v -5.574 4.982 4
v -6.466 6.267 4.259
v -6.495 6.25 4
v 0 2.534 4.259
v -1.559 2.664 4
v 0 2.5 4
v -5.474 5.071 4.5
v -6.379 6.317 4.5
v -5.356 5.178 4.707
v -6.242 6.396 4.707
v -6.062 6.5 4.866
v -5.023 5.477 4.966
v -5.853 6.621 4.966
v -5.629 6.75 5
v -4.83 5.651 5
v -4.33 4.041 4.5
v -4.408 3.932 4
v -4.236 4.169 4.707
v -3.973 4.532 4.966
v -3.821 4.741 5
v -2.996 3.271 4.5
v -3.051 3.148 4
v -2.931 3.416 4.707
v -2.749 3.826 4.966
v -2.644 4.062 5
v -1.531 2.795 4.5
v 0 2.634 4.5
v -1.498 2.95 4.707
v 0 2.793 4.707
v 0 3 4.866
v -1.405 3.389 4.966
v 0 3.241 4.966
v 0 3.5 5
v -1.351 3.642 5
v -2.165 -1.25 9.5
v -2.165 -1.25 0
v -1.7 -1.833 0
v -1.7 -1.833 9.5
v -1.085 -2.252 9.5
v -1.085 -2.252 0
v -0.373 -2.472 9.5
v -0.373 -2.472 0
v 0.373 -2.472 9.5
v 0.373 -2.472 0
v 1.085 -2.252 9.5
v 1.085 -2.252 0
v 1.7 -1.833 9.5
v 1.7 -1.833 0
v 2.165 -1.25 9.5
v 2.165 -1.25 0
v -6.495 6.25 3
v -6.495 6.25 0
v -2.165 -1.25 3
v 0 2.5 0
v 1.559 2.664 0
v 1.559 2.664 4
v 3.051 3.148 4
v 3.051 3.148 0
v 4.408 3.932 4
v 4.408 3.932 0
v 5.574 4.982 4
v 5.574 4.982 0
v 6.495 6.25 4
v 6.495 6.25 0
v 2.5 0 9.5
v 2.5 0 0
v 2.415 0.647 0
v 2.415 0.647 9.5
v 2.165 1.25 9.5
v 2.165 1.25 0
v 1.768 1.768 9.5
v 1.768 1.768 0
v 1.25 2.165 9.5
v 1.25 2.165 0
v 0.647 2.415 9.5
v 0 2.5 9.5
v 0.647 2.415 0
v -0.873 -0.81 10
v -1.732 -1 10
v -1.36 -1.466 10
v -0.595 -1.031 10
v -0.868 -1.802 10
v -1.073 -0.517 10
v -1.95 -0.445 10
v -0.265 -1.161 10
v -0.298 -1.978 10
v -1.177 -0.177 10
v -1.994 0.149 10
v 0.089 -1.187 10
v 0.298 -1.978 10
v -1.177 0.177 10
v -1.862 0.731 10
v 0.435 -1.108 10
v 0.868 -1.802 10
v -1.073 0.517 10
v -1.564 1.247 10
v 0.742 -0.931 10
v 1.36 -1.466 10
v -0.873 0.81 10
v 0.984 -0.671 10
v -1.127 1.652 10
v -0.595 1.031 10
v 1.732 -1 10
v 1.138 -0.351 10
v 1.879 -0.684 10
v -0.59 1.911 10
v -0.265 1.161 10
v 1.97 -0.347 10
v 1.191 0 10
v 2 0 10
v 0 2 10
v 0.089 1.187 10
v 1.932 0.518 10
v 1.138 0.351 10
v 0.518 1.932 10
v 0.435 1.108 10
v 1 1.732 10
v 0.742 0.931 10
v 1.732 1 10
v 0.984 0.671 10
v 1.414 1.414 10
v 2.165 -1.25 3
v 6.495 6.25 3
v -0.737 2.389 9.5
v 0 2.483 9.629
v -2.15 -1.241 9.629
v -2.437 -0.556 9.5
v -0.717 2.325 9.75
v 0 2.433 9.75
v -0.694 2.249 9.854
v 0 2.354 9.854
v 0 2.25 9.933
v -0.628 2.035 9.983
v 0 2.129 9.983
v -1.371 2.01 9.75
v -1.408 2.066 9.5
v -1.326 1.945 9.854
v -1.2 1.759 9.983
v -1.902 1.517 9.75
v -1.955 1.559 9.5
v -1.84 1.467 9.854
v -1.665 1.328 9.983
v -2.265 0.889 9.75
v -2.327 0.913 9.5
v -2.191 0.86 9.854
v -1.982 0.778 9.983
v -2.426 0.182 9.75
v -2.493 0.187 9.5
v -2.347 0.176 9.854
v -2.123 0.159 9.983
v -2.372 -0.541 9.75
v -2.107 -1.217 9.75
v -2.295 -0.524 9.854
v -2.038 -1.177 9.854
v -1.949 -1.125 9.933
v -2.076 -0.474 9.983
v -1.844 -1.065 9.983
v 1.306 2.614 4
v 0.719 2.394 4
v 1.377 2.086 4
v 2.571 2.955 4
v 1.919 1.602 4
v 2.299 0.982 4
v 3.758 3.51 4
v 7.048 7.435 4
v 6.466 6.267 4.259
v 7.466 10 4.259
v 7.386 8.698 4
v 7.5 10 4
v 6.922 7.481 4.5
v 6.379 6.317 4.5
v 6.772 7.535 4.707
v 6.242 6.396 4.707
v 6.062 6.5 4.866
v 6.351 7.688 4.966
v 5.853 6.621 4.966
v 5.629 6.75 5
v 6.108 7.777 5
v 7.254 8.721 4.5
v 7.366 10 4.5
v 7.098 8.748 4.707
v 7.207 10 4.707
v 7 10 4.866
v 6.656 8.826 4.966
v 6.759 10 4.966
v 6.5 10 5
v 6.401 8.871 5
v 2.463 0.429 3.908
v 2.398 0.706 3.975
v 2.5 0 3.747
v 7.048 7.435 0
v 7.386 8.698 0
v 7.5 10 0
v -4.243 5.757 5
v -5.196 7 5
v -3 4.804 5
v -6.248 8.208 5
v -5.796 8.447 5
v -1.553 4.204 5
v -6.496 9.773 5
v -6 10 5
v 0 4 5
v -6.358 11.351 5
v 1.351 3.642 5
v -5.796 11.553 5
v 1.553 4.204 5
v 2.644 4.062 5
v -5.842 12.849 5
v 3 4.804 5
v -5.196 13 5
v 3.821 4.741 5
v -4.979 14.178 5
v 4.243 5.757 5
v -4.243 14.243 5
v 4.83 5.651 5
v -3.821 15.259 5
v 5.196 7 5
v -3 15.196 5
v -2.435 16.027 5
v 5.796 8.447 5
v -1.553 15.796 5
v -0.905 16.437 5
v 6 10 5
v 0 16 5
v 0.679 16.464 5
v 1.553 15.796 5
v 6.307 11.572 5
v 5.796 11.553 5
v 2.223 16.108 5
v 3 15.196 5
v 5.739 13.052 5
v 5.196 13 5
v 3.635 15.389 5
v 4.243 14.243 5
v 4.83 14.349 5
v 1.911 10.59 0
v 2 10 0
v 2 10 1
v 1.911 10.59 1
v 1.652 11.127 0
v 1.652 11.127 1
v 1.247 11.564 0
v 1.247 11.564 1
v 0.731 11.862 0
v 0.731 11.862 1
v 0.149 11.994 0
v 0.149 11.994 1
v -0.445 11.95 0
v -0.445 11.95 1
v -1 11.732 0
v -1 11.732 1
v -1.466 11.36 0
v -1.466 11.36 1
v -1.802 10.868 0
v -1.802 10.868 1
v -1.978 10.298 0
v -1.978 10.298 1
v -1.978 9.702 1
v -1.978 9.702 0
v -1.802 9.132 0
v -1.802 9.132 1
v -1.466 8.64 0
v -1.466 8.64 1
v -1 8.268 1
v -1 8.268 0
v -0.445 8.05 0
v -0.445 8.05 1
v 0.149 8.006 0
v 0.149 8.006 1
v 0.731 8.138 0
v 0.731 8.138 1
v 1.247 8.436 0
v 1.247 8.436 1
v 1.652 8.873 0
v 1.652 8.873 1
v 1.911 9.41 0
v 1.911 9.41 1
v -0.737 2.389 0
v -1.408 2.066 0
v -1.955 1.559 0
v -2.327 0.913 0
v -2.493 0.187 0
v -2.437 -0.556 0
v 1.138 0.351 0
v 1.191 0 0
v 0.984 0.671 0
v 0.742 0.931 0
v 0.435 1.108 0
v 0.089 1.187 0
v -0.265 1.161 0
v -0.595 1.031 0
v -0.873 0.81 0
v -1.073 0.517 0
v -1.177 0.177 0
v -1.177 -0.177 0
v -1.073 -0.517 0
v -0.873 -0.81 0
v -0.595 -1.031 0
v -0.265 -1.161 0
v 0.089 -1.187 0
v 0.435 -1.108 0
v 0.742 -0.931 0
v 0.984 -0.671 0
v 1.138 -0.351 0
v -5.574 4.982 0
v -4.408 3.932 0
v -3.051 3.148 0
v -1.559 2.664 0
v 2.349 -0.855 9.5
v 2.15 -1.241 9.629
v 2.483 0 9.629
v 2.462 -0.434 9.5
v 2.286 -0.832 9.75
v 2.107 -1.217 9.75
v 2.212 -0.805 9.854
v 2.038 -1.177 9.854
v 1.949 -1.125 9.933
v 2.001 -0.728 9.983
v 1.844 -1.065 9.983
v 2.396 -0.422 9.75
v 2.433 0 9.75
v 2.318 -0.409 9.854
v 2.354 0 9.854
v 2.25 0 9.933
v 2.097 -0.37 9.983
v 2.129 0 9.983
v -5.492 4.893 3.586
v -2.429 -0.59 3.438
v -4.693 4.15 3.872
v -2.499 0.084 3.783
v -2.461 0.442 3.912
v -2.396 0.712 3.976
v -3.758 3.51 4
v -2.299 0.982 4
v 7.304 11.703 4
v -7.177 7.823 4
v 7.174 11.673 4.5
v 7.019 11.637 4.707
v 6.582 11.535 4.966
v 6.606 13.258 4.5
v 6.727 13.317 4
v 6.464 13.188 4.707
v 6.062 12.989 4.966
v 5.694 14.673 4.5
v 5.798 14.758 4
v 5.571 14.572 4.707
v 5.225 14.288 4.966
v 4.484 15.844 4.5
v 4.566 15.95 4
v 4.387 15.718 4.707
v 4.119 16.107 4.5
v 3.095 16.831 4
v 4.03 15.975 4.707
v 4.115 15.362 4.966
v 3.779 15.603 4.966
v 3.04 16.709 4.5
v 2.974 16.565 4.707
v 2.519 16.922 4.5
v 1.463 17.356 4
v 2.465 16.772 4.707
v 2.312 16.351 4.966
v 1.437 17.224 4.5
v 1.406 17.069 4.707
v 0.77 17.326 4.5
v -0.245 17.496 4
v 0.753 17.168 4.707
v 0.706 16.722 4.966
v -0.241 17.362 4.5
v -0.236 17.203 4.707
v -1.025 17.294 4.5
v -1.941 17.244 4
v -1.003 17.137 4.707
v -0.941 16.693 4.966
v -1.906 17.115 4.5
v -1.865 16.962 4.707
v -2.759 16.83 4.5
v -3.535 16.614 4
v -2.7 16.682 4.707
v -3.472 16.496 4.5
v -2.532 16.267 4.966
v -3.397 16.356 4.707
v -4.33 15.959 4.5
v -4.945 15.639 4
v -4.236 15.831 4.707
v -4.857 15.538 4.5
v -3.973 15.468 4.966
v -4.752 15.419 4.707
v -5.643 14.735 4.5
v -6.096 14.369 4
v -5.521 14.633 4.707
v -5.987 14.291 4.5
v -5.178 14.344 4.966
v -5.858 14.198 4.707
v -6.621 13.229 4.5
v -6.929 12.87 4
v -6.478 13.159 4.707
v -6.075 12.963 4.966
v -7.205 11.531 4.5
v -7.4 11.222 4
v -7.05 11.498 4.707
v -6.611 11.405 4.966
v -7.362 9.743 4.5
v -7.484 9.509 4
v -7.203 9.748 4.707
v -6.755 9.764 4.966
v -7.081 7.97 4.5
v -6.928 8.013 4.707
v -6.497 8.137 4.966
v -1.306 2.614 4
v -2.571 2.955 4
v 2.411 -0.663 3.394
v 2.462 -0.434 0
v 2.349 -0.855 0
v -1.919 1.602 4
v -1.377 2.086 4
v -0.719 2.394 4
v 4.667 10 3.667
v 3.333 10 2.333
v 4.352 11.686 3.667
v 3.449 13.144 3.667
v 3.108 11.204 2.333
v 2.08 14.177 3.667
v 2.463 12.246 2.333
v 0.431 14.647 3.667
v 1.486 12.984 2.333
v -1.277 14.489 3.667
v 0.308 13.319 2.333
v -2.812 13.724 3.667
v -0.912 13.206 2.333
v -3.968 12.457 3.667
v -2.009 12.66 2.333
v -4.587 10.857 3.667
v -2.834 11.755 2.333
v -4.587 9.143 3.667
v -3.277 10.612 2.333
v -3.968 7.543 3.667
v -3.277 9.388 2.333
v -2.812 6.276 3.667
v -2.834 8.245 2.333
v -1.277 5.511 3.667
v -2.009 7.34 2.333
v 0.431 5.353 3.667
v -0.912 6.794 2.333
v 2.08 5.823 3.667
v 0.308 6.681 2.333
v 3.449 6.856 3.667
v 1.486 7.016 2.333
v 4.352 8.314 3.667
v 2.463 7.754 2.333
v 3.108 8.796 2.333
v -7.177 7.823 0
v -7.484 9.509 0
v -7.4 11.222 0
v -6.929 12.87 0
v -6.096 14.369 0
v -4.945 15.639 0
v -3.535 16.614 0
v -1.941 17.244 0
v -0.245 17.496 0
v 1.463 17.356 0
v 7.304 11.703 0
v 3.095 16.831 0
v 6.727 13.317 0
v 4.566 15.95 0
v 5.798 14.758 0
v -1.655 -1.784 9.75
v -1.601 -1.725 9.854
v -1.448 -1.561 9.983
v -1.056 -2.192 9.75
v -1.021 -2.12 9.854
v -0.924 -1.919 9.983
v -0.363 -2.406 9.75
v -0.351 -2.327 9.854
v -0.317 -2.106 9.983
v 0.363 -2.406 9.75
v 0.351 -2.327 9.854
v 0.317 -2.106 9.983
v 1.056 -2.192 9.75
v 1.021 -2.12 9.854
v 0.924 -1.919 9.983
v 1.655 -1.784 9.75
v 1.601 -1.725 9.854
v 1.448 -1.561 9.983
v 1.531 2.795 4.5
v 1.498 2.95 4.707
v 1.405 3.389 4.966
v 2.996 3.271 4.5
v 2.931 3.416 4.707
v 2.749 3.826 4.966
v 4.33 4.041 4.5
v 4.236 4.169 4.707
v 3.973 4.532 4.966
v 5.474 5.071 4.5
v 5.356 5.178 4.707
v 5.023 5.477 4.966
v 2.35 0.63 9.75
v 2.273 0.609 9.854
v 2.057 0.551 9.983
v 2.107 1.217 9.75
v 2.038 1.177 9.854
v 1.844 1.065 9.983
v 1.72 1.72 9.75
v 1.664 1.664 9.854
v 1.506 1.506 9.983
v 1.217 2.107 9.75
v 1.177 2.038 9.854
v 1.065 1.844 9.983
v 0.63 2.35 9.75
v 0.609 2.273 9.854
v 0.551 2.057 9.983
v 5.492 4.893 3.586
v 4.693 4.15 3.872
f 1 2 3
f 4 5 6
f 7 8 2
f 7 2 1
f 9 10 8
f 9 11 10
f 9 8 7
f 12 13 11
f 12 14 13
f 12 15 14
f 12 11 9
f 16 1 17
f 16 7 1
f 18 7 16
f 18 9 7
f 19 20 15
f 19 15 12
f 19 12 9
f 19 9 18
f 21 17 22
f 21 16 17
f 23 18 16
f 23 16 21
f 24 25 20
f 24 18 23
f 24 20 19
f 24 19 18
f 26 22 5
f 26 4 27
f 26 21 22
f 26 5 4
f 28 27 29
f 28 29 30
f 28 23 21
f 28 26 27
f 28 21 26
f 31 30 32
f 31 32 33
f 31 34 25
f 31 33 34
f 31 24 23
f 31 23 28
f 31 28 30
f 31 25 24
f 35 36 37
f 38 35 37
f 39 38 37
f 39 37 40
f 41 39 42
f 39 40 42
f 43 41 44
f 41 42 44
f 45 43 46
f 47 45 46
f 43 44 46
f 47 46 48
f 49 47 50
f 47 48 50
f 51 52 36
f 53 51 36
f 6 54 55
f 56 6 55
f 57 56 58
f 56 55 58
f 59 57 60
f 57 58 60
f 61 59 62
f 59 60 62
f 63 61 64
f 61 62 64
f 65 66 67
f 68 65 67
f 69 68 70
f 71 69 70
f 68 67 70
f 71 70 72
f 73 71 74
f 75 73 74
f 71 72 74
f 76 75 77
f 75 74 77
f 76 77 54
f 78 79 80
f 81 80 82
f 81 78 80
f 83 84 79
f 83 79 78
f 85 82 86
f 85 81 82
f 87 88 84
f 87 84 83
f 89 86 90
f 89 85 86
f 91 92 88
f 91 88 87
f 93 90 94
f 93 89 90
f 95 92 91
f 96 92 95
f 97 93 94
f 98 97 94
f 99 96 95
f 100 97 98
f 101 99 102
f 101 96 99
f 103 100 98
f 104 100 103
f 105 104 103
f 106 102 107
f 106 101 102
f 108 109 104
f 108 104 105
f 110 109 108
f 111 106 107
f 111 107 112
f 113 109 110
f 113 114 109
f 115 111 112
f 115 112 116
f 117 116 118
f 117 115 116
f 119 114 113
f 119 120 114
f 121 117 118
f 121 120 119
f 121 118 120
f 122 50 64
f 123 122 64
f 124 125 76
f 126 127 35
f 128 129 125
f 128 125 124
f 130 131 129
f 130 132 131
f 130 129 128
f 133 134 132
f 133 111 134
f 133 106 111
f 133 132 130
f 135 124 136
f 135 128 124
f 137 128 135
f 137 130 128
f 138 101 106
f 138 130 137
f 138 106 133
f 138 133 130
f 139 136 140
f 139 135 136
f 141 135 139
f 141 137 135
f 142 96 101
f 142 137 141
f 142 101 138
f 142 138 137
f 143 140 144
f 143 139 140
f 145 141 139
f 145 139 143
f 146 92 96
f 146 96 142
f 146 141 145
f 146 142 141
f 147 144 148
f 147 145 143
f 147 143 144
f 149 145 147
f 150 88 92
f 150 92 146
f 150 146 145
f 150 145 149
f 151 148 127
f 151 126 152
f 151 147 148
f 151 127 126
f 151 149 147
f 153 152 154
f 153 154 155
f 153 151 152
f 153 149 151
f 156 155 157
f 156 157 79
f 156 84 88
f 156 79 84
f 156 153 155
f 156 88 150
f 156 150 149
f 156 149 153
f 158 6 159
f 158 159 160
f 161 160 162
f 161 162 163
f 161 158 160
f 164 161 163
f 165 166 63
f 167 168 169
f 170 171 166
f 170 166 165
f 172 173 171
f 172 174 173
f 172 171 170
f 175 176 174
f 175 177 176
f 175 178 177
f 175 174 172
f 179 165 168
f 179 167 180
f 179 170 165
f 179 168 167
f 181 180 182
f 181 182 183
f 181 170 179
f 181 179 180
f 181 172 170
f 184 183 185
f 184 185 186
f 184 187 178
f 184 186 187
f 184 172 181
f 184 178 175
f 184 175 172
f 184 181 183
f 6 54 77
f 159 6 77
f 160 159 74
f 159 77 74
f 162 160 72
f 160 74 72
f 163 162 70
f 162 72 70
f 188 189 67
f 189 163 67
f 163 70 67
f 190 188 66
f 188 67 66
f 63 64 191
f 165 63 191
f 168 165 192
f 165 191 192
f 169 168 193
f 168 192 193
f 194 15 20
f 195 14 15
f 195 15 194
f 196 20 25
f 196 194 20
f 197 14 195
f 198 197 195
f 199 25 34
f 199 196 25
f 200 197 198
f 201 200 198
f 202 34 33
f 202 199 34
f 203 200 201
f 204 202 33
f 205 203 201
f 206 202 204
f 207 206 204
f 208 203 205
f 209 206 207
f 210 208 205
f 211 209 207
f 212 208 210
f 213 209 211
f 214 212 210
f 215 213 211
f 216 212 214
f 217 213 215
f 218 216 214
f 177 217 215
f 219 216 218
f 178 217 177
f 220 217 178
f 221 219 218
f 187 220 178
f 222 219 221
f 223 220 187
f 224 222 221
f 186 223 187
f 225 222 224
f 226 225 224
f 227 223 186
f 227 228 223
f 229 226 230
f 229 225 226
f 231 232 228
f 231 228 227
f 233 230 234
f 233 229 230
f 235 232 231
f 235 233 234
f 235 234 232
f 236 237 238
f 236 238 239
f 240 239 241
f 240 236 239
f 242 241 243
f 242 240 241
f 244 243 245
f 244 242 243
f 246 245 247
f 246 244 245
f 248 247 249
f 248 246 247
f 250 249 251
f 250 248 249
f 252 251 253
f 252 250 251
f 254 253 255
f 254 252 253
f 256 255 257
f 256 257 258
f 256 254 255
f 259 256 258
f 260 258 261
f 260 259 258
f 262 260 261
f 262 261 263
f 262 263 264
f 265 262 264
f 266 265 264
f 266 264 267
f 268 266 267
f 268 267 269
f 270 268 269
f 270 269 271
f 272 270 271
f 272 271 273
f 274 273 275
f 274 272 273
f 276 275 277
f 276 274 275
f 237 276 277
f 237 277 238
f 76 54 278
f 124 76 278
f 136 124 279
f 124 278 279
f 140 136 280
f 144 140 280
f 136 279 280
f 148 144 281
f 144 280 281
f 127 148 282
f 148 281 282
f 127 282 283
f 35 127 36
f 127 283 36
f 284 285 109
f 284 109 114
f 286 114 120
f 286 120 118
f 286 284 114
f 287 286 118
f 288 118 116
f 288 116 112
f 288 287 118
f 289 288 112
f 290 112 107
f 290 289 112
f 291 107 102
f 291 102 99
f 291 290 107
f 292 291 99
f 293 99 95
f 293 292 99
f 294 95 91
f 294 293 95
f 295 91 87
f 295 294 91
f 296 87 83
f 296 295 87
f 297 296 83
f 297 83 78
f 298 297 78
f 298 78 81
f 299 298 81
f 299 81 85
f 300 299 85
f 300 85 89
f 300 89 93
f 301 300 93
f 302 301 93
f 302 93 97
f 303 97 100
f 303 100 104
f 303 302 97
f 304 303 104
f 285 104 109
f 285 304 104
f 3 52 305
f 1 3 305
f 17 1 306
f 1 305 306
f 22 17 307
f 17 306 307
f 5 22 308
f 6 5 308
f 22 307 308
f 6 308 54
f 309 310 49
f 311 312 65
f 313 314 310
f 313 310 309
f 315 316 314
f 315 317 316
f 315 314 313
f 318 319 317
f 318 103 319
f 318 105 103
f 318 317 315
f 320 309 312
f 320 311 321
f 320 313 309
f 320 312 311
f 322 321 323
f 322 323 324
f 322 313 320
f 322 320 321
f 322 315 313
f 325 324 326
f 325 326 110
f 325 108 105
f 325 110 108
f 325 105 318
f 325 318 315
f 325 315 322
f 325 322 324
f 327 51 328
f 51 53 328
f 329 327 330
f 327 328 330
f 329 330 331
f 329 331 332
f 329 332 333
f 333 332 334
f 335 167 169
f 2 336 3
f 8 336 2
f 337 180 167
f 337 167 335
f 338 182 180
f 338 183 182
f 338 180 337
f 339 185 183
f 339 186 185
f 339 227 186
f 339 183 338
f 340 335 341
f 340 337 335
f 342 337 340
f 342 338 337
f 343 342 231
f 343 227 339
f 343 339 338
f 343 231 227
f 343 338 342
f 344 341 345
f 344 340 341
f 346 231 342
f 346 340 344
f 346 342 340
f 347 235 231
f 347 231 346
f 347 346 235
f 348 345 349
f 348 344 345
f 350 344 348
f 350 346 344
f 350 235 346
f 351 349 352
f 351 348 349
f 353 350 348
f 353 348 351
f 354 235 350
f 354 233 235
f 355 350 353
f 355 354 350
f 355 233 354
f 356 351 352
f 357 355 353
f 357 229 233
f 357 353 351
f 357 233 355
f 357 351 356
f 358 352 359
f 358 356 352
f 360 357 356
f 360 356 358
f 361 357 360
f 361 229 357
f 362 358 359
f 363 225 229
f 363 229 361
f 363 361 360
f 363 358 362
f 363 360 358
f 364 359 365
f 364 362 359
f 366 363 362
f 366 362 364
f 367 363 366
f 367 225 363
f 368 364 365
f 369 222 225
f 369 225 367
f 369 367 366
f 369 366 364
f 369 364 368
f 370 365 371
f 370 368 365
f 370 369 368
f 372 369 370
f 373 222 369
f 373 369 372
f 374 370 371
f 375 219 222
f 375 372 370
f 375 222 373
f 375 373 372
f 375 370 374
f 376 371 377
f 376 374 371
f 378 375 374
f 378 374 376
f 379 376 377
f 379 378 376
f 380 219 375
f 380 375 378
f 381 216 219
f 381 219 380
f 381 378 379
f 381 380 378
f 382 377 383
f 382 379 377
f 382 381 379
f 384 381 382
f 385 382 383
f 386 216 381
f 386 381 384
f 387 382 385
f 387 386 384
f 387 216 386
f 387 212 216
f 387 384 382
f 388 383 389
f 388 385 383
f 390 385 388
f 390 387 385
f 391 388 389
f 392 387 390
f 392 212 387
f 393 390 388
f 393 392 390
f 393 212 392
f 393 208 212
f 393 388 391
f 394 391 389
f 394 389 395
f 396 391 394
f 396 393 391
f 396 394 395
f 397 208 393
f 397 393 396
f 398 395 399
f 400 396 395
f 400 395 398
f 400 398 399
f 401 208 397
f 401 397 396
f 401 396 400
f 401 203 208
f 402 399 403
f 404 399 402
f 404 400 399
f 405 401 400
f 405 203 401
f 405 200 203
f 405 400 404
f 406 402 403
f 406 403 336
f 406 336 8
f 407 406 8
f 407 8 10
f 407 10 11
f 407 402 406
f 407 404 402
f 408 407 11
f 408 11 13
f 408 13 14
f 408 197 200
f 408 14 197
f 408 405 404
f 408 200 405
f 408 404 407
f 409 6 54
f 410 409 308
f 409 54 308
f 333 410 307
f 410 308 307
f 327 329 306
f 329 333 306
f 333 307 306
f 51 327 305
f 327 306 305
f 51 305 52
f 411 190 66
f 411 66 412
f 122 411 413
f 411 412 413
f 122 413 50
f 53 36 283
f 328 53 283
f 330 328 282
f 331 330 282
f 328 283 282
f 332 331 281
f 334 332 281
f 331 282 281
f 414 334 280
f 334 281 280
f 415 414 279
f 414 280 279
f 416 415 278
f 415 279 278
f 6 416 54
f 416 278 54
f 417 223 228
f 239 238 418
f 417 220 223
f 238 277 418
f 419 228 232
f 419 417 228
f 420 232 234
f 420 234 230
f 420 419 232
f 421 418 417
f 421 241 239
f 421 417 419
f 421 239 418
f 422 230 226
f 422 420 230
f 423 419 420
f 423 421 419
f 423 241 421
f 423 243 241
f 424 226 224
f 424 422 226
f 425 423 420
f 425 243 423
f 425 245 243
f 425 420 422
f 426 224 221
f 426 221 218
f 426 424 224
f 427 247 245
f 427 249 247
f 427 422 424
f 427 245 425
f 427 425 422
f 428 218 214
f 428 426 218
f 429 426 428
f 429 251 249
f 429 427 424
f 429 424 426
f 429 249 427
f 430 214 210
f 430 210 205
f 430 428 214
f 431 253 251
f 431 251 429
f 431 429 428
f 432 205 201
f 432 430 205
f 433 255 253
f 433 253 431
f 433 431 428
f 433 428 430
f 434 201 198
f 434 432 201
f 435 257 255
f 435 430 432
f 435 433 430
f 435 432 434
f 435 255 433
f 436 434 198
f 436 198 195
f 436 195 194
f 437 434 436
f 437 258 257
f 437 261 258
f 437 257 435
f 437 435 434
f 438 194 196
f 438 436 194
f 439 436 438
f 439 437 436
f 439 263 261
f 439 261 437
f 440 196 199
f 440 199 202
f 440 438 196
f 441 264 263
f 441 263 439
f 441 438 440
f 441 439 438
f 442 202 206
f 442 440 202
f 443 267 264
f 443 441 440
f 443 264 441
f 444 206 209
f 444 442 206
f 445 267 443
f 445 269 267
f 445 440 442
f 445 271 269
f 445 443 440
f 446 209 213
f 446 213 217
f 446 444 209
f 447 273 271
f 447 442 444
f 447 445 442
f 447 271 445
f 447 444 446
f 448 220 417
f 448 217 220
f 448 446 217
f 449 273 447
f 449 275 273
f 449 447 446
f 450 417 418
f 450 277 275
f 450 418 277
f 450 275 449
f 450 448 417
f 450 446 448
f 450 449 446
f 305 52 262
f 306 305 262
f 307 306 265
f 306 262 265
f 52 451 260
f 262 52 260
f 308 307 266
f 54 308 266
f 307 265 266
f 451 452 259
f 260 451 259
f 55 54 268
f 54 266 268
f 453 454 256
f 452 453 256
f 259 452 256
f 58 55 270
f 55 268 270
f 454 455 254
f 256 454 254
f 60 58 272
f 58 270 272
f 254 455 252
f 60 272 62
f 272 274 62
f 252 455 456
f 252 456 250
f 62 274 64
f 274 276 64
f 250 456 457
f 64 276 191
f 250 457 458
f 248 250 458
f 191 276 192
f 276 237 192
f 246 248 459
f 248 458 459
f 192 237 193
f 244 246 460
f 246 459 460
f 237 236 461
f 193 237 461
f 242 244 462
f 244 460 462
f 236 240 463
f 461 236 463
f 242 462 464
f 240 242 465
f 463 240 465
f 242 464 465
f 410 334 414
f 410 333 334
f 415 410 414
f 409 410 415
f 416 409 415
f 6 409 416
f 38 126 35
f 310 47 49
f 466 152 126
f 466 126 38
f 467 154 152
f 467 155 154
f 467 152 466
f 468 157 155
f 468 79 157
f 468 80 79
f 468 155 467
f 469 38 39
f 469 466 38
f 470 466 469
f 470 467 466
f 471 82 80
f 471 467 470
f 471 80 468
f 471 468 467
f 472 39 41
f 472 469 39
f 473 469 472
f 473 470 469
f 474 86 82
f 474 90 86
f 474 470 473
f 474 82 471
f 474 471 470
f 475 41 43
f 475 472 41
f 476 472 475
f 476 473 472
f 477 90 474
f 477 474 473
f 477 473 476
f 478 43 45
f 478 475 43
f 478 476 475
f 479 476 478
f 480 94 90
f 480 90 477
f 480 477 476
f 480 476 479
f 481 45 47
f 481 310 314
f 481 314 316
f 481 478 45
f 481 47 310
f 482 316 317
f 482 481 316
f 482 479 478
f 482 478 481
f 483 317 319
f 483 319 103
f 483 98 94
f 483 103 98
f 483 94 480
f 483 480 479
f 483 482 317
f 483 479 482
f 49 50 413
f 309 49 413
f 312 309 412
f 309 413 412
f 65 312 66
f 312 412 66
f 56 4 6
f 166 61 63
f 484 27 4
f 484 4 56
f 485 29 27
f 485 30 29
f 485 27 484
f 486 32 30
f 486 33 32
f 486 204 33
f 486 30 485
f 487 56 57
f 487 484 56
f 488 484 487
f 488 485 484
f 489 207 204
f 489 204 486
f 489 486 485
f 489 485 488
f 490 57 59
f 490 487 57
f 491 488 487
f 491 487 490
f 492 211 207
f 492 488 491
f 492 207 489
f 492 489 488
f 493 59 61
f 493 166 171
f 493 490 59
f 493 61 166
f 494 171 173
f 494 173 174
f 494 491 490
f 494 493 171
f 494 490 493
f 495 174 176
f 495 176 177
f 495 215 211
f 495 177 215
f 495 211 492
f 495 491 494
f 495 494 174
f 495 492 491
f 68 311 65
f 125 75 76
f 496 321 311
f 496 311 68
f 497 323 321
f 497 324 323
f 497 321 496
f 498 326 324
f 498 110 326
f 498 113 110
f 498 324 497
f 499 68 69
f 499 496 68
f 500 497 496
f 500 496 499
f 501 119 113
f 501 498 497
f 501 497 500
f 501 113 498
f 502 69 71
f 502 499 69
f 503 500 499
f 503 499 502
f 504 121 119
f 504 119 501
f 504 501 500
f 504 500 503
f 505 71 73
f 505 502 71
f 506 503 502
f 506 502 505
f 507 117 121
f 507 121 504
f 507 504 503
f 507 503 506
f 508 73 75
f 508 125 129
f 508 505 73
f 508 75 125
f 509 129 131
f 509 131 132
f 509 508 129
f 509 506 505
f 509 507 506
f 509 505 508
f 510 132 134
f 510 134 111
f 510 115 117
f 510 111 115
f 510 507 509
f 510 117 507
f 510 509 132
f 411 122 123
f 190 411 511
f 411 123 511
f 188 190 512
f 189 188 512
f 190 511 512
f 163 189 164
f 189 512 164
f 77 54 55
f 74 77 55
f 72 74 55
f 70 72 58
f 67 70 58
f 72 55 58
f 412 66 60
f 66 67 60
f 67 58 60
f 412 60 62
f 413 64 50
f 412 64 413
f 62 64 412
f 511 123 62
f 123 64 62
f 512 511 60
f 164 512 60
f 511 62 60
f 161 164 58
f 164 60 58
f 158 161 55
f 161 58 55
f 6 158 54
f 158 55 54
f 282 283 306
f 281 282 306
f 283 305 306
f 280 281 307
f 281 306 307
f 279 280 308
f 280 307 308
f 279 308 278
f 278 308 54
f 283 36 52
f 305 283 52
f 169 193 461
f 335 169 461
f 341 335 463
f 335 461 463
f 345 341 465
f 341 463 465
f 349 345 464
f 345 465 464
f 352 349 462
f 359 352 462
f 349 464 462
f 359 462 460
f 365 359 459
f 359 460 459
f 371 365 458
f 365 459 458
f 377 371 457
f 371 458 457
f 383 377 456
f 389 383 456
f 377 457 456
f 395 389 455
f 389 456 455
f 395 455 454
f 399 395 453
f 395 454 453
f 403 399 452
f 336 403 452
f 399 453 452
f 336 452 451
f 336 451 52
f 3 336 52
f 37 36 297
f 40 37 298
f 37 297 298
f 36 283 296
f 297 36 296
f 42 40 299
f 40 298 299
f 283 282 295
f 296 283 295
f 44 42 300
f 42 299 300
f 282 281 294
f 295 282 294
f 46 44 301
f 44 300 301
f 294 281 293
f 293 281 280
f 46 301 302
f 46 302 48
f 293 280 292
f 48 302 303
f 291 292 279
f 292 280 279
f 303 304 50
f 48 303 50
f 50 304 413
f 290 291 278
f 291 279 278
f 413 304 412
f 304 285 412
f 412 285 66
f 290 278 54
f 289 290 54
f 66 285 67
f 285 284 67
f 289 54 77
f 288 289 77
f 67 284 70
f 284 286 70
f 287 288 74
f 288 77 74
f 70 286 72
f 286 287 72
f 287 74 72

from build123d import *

# Parameters (mm, degrees)
F0_R     = 2
F1_DEPTH = 5
F0_R_2   = 1.190625
F2_DEPTH = 10
F3_DEPTH = 4
F4_R     = 1
F4_2_R   = 1
F5_SIZE  = 4
F6_R     = 0.5


with BuildPart() as f1:
    # F0 (on Top) → F1 (new body)
    with BuildSketch(Plane.XY):
        with BuildLine():
            ThreePointArc((-6.495191, 6.25), (-3.75, 3.504809), (0, 2.5))
            ThreePointArc((0, 2.5), (3.75, 3.504809), (6.495191, 6.25))
            ThreePointArc((6.495191, 6.25), (7.244444, 8.058857), (7.5, 10))
            ThreePointArc((7.5, 10), (-1.941143, 17.244444), (-6.495191, 6.25))
        make_face()
        with Locations((0, 10)):
            Circle(F0_R, mode=Mode.SUBTRACT)
    extrude(amount=F1_DEPTH)

    # F4
    f4_edges = [f1.edges().sort_by_distance(p)[0] for p in [
        (6.495191, 13.75, 5),
    ]]
    fillet(f4_edges, radius=F4_R)

    # F5
    f5_edges = [f1.edges().sort_by_distance(p)[0] for p in [
        (-2, 10, 5),
    ]]
    chamfer(f5_edges, length=F5_SIZE)


with BuildPart() as f2:
    # F0 (on Top) → F2 (new body)
    with BuildSketch(Plane.XY):
        with BuildLine():
            ThreePointArc((0, 2.5), (-2.165064, 1.25), (-2.165064, -1.25))
            ThreePointArc((-2.165064, -1.25), (0, -2.5), (2.165064, -1.25))
            ThreePointArc((2.165064, -1.25), (2.414815, -0.647048), (2.5, 0))
            ThreePointArc((2.5, 0), (1.767767, 1.767767), (0, 2.5))
        make_face()
        Circle(F0_R_2, mode=Mode.SUBTRACT)
    extrude(amount=F2_DEPTH)

    # F6
    f6_edges = [f2.edges().sort_by_distance(p)[0] for p in [
        (0, -2.5, 10),
    ]]
    fillet(f6_edges, radius=F6_R)


with BuildPart() as f3:
    # F0 (on Top) → F3 (new body)
    with BuildSketch(Plane.XY):
        with BuildLine():
            ThreePointArc((2.5, 0), (2.414815, -0.647048), (2.165064, -1.25))
            Line((2.165064, -1.25), (6.495191, 6.25))
            ThreePointArc((6.495191, 6.25), (3.75, 3.504809), (0, 2.5))
            ThreePointArc((0, 2.5), (1.767767, 1.767767), (2.5, 0))
        make_face()
        with BuildLine():
            Line((-6.495191, 6.25), (-2.165064, -1.25))
            ThreePointArc((-2.165064, -1.25), (-2.165064, 1.25), (0, 2.5))
            ThreePointArc((0, 2.5), (-3.75, 3.504809), (-6.495191, 6.25))
        make_face()
    extrude(amount=F3_DEPTH)

    # F4#2
    f4_2_edges = [f3.edges().sort_by_distance(p)[0] for p in [
        (4.330127, 2.5, 4),
        (-4.330127, 2.5, 4),
    ]]
    fillet(f4_2_edges, radius=F4_2_R)


solid = Compound([f1.part, f2.part, f3.part])
